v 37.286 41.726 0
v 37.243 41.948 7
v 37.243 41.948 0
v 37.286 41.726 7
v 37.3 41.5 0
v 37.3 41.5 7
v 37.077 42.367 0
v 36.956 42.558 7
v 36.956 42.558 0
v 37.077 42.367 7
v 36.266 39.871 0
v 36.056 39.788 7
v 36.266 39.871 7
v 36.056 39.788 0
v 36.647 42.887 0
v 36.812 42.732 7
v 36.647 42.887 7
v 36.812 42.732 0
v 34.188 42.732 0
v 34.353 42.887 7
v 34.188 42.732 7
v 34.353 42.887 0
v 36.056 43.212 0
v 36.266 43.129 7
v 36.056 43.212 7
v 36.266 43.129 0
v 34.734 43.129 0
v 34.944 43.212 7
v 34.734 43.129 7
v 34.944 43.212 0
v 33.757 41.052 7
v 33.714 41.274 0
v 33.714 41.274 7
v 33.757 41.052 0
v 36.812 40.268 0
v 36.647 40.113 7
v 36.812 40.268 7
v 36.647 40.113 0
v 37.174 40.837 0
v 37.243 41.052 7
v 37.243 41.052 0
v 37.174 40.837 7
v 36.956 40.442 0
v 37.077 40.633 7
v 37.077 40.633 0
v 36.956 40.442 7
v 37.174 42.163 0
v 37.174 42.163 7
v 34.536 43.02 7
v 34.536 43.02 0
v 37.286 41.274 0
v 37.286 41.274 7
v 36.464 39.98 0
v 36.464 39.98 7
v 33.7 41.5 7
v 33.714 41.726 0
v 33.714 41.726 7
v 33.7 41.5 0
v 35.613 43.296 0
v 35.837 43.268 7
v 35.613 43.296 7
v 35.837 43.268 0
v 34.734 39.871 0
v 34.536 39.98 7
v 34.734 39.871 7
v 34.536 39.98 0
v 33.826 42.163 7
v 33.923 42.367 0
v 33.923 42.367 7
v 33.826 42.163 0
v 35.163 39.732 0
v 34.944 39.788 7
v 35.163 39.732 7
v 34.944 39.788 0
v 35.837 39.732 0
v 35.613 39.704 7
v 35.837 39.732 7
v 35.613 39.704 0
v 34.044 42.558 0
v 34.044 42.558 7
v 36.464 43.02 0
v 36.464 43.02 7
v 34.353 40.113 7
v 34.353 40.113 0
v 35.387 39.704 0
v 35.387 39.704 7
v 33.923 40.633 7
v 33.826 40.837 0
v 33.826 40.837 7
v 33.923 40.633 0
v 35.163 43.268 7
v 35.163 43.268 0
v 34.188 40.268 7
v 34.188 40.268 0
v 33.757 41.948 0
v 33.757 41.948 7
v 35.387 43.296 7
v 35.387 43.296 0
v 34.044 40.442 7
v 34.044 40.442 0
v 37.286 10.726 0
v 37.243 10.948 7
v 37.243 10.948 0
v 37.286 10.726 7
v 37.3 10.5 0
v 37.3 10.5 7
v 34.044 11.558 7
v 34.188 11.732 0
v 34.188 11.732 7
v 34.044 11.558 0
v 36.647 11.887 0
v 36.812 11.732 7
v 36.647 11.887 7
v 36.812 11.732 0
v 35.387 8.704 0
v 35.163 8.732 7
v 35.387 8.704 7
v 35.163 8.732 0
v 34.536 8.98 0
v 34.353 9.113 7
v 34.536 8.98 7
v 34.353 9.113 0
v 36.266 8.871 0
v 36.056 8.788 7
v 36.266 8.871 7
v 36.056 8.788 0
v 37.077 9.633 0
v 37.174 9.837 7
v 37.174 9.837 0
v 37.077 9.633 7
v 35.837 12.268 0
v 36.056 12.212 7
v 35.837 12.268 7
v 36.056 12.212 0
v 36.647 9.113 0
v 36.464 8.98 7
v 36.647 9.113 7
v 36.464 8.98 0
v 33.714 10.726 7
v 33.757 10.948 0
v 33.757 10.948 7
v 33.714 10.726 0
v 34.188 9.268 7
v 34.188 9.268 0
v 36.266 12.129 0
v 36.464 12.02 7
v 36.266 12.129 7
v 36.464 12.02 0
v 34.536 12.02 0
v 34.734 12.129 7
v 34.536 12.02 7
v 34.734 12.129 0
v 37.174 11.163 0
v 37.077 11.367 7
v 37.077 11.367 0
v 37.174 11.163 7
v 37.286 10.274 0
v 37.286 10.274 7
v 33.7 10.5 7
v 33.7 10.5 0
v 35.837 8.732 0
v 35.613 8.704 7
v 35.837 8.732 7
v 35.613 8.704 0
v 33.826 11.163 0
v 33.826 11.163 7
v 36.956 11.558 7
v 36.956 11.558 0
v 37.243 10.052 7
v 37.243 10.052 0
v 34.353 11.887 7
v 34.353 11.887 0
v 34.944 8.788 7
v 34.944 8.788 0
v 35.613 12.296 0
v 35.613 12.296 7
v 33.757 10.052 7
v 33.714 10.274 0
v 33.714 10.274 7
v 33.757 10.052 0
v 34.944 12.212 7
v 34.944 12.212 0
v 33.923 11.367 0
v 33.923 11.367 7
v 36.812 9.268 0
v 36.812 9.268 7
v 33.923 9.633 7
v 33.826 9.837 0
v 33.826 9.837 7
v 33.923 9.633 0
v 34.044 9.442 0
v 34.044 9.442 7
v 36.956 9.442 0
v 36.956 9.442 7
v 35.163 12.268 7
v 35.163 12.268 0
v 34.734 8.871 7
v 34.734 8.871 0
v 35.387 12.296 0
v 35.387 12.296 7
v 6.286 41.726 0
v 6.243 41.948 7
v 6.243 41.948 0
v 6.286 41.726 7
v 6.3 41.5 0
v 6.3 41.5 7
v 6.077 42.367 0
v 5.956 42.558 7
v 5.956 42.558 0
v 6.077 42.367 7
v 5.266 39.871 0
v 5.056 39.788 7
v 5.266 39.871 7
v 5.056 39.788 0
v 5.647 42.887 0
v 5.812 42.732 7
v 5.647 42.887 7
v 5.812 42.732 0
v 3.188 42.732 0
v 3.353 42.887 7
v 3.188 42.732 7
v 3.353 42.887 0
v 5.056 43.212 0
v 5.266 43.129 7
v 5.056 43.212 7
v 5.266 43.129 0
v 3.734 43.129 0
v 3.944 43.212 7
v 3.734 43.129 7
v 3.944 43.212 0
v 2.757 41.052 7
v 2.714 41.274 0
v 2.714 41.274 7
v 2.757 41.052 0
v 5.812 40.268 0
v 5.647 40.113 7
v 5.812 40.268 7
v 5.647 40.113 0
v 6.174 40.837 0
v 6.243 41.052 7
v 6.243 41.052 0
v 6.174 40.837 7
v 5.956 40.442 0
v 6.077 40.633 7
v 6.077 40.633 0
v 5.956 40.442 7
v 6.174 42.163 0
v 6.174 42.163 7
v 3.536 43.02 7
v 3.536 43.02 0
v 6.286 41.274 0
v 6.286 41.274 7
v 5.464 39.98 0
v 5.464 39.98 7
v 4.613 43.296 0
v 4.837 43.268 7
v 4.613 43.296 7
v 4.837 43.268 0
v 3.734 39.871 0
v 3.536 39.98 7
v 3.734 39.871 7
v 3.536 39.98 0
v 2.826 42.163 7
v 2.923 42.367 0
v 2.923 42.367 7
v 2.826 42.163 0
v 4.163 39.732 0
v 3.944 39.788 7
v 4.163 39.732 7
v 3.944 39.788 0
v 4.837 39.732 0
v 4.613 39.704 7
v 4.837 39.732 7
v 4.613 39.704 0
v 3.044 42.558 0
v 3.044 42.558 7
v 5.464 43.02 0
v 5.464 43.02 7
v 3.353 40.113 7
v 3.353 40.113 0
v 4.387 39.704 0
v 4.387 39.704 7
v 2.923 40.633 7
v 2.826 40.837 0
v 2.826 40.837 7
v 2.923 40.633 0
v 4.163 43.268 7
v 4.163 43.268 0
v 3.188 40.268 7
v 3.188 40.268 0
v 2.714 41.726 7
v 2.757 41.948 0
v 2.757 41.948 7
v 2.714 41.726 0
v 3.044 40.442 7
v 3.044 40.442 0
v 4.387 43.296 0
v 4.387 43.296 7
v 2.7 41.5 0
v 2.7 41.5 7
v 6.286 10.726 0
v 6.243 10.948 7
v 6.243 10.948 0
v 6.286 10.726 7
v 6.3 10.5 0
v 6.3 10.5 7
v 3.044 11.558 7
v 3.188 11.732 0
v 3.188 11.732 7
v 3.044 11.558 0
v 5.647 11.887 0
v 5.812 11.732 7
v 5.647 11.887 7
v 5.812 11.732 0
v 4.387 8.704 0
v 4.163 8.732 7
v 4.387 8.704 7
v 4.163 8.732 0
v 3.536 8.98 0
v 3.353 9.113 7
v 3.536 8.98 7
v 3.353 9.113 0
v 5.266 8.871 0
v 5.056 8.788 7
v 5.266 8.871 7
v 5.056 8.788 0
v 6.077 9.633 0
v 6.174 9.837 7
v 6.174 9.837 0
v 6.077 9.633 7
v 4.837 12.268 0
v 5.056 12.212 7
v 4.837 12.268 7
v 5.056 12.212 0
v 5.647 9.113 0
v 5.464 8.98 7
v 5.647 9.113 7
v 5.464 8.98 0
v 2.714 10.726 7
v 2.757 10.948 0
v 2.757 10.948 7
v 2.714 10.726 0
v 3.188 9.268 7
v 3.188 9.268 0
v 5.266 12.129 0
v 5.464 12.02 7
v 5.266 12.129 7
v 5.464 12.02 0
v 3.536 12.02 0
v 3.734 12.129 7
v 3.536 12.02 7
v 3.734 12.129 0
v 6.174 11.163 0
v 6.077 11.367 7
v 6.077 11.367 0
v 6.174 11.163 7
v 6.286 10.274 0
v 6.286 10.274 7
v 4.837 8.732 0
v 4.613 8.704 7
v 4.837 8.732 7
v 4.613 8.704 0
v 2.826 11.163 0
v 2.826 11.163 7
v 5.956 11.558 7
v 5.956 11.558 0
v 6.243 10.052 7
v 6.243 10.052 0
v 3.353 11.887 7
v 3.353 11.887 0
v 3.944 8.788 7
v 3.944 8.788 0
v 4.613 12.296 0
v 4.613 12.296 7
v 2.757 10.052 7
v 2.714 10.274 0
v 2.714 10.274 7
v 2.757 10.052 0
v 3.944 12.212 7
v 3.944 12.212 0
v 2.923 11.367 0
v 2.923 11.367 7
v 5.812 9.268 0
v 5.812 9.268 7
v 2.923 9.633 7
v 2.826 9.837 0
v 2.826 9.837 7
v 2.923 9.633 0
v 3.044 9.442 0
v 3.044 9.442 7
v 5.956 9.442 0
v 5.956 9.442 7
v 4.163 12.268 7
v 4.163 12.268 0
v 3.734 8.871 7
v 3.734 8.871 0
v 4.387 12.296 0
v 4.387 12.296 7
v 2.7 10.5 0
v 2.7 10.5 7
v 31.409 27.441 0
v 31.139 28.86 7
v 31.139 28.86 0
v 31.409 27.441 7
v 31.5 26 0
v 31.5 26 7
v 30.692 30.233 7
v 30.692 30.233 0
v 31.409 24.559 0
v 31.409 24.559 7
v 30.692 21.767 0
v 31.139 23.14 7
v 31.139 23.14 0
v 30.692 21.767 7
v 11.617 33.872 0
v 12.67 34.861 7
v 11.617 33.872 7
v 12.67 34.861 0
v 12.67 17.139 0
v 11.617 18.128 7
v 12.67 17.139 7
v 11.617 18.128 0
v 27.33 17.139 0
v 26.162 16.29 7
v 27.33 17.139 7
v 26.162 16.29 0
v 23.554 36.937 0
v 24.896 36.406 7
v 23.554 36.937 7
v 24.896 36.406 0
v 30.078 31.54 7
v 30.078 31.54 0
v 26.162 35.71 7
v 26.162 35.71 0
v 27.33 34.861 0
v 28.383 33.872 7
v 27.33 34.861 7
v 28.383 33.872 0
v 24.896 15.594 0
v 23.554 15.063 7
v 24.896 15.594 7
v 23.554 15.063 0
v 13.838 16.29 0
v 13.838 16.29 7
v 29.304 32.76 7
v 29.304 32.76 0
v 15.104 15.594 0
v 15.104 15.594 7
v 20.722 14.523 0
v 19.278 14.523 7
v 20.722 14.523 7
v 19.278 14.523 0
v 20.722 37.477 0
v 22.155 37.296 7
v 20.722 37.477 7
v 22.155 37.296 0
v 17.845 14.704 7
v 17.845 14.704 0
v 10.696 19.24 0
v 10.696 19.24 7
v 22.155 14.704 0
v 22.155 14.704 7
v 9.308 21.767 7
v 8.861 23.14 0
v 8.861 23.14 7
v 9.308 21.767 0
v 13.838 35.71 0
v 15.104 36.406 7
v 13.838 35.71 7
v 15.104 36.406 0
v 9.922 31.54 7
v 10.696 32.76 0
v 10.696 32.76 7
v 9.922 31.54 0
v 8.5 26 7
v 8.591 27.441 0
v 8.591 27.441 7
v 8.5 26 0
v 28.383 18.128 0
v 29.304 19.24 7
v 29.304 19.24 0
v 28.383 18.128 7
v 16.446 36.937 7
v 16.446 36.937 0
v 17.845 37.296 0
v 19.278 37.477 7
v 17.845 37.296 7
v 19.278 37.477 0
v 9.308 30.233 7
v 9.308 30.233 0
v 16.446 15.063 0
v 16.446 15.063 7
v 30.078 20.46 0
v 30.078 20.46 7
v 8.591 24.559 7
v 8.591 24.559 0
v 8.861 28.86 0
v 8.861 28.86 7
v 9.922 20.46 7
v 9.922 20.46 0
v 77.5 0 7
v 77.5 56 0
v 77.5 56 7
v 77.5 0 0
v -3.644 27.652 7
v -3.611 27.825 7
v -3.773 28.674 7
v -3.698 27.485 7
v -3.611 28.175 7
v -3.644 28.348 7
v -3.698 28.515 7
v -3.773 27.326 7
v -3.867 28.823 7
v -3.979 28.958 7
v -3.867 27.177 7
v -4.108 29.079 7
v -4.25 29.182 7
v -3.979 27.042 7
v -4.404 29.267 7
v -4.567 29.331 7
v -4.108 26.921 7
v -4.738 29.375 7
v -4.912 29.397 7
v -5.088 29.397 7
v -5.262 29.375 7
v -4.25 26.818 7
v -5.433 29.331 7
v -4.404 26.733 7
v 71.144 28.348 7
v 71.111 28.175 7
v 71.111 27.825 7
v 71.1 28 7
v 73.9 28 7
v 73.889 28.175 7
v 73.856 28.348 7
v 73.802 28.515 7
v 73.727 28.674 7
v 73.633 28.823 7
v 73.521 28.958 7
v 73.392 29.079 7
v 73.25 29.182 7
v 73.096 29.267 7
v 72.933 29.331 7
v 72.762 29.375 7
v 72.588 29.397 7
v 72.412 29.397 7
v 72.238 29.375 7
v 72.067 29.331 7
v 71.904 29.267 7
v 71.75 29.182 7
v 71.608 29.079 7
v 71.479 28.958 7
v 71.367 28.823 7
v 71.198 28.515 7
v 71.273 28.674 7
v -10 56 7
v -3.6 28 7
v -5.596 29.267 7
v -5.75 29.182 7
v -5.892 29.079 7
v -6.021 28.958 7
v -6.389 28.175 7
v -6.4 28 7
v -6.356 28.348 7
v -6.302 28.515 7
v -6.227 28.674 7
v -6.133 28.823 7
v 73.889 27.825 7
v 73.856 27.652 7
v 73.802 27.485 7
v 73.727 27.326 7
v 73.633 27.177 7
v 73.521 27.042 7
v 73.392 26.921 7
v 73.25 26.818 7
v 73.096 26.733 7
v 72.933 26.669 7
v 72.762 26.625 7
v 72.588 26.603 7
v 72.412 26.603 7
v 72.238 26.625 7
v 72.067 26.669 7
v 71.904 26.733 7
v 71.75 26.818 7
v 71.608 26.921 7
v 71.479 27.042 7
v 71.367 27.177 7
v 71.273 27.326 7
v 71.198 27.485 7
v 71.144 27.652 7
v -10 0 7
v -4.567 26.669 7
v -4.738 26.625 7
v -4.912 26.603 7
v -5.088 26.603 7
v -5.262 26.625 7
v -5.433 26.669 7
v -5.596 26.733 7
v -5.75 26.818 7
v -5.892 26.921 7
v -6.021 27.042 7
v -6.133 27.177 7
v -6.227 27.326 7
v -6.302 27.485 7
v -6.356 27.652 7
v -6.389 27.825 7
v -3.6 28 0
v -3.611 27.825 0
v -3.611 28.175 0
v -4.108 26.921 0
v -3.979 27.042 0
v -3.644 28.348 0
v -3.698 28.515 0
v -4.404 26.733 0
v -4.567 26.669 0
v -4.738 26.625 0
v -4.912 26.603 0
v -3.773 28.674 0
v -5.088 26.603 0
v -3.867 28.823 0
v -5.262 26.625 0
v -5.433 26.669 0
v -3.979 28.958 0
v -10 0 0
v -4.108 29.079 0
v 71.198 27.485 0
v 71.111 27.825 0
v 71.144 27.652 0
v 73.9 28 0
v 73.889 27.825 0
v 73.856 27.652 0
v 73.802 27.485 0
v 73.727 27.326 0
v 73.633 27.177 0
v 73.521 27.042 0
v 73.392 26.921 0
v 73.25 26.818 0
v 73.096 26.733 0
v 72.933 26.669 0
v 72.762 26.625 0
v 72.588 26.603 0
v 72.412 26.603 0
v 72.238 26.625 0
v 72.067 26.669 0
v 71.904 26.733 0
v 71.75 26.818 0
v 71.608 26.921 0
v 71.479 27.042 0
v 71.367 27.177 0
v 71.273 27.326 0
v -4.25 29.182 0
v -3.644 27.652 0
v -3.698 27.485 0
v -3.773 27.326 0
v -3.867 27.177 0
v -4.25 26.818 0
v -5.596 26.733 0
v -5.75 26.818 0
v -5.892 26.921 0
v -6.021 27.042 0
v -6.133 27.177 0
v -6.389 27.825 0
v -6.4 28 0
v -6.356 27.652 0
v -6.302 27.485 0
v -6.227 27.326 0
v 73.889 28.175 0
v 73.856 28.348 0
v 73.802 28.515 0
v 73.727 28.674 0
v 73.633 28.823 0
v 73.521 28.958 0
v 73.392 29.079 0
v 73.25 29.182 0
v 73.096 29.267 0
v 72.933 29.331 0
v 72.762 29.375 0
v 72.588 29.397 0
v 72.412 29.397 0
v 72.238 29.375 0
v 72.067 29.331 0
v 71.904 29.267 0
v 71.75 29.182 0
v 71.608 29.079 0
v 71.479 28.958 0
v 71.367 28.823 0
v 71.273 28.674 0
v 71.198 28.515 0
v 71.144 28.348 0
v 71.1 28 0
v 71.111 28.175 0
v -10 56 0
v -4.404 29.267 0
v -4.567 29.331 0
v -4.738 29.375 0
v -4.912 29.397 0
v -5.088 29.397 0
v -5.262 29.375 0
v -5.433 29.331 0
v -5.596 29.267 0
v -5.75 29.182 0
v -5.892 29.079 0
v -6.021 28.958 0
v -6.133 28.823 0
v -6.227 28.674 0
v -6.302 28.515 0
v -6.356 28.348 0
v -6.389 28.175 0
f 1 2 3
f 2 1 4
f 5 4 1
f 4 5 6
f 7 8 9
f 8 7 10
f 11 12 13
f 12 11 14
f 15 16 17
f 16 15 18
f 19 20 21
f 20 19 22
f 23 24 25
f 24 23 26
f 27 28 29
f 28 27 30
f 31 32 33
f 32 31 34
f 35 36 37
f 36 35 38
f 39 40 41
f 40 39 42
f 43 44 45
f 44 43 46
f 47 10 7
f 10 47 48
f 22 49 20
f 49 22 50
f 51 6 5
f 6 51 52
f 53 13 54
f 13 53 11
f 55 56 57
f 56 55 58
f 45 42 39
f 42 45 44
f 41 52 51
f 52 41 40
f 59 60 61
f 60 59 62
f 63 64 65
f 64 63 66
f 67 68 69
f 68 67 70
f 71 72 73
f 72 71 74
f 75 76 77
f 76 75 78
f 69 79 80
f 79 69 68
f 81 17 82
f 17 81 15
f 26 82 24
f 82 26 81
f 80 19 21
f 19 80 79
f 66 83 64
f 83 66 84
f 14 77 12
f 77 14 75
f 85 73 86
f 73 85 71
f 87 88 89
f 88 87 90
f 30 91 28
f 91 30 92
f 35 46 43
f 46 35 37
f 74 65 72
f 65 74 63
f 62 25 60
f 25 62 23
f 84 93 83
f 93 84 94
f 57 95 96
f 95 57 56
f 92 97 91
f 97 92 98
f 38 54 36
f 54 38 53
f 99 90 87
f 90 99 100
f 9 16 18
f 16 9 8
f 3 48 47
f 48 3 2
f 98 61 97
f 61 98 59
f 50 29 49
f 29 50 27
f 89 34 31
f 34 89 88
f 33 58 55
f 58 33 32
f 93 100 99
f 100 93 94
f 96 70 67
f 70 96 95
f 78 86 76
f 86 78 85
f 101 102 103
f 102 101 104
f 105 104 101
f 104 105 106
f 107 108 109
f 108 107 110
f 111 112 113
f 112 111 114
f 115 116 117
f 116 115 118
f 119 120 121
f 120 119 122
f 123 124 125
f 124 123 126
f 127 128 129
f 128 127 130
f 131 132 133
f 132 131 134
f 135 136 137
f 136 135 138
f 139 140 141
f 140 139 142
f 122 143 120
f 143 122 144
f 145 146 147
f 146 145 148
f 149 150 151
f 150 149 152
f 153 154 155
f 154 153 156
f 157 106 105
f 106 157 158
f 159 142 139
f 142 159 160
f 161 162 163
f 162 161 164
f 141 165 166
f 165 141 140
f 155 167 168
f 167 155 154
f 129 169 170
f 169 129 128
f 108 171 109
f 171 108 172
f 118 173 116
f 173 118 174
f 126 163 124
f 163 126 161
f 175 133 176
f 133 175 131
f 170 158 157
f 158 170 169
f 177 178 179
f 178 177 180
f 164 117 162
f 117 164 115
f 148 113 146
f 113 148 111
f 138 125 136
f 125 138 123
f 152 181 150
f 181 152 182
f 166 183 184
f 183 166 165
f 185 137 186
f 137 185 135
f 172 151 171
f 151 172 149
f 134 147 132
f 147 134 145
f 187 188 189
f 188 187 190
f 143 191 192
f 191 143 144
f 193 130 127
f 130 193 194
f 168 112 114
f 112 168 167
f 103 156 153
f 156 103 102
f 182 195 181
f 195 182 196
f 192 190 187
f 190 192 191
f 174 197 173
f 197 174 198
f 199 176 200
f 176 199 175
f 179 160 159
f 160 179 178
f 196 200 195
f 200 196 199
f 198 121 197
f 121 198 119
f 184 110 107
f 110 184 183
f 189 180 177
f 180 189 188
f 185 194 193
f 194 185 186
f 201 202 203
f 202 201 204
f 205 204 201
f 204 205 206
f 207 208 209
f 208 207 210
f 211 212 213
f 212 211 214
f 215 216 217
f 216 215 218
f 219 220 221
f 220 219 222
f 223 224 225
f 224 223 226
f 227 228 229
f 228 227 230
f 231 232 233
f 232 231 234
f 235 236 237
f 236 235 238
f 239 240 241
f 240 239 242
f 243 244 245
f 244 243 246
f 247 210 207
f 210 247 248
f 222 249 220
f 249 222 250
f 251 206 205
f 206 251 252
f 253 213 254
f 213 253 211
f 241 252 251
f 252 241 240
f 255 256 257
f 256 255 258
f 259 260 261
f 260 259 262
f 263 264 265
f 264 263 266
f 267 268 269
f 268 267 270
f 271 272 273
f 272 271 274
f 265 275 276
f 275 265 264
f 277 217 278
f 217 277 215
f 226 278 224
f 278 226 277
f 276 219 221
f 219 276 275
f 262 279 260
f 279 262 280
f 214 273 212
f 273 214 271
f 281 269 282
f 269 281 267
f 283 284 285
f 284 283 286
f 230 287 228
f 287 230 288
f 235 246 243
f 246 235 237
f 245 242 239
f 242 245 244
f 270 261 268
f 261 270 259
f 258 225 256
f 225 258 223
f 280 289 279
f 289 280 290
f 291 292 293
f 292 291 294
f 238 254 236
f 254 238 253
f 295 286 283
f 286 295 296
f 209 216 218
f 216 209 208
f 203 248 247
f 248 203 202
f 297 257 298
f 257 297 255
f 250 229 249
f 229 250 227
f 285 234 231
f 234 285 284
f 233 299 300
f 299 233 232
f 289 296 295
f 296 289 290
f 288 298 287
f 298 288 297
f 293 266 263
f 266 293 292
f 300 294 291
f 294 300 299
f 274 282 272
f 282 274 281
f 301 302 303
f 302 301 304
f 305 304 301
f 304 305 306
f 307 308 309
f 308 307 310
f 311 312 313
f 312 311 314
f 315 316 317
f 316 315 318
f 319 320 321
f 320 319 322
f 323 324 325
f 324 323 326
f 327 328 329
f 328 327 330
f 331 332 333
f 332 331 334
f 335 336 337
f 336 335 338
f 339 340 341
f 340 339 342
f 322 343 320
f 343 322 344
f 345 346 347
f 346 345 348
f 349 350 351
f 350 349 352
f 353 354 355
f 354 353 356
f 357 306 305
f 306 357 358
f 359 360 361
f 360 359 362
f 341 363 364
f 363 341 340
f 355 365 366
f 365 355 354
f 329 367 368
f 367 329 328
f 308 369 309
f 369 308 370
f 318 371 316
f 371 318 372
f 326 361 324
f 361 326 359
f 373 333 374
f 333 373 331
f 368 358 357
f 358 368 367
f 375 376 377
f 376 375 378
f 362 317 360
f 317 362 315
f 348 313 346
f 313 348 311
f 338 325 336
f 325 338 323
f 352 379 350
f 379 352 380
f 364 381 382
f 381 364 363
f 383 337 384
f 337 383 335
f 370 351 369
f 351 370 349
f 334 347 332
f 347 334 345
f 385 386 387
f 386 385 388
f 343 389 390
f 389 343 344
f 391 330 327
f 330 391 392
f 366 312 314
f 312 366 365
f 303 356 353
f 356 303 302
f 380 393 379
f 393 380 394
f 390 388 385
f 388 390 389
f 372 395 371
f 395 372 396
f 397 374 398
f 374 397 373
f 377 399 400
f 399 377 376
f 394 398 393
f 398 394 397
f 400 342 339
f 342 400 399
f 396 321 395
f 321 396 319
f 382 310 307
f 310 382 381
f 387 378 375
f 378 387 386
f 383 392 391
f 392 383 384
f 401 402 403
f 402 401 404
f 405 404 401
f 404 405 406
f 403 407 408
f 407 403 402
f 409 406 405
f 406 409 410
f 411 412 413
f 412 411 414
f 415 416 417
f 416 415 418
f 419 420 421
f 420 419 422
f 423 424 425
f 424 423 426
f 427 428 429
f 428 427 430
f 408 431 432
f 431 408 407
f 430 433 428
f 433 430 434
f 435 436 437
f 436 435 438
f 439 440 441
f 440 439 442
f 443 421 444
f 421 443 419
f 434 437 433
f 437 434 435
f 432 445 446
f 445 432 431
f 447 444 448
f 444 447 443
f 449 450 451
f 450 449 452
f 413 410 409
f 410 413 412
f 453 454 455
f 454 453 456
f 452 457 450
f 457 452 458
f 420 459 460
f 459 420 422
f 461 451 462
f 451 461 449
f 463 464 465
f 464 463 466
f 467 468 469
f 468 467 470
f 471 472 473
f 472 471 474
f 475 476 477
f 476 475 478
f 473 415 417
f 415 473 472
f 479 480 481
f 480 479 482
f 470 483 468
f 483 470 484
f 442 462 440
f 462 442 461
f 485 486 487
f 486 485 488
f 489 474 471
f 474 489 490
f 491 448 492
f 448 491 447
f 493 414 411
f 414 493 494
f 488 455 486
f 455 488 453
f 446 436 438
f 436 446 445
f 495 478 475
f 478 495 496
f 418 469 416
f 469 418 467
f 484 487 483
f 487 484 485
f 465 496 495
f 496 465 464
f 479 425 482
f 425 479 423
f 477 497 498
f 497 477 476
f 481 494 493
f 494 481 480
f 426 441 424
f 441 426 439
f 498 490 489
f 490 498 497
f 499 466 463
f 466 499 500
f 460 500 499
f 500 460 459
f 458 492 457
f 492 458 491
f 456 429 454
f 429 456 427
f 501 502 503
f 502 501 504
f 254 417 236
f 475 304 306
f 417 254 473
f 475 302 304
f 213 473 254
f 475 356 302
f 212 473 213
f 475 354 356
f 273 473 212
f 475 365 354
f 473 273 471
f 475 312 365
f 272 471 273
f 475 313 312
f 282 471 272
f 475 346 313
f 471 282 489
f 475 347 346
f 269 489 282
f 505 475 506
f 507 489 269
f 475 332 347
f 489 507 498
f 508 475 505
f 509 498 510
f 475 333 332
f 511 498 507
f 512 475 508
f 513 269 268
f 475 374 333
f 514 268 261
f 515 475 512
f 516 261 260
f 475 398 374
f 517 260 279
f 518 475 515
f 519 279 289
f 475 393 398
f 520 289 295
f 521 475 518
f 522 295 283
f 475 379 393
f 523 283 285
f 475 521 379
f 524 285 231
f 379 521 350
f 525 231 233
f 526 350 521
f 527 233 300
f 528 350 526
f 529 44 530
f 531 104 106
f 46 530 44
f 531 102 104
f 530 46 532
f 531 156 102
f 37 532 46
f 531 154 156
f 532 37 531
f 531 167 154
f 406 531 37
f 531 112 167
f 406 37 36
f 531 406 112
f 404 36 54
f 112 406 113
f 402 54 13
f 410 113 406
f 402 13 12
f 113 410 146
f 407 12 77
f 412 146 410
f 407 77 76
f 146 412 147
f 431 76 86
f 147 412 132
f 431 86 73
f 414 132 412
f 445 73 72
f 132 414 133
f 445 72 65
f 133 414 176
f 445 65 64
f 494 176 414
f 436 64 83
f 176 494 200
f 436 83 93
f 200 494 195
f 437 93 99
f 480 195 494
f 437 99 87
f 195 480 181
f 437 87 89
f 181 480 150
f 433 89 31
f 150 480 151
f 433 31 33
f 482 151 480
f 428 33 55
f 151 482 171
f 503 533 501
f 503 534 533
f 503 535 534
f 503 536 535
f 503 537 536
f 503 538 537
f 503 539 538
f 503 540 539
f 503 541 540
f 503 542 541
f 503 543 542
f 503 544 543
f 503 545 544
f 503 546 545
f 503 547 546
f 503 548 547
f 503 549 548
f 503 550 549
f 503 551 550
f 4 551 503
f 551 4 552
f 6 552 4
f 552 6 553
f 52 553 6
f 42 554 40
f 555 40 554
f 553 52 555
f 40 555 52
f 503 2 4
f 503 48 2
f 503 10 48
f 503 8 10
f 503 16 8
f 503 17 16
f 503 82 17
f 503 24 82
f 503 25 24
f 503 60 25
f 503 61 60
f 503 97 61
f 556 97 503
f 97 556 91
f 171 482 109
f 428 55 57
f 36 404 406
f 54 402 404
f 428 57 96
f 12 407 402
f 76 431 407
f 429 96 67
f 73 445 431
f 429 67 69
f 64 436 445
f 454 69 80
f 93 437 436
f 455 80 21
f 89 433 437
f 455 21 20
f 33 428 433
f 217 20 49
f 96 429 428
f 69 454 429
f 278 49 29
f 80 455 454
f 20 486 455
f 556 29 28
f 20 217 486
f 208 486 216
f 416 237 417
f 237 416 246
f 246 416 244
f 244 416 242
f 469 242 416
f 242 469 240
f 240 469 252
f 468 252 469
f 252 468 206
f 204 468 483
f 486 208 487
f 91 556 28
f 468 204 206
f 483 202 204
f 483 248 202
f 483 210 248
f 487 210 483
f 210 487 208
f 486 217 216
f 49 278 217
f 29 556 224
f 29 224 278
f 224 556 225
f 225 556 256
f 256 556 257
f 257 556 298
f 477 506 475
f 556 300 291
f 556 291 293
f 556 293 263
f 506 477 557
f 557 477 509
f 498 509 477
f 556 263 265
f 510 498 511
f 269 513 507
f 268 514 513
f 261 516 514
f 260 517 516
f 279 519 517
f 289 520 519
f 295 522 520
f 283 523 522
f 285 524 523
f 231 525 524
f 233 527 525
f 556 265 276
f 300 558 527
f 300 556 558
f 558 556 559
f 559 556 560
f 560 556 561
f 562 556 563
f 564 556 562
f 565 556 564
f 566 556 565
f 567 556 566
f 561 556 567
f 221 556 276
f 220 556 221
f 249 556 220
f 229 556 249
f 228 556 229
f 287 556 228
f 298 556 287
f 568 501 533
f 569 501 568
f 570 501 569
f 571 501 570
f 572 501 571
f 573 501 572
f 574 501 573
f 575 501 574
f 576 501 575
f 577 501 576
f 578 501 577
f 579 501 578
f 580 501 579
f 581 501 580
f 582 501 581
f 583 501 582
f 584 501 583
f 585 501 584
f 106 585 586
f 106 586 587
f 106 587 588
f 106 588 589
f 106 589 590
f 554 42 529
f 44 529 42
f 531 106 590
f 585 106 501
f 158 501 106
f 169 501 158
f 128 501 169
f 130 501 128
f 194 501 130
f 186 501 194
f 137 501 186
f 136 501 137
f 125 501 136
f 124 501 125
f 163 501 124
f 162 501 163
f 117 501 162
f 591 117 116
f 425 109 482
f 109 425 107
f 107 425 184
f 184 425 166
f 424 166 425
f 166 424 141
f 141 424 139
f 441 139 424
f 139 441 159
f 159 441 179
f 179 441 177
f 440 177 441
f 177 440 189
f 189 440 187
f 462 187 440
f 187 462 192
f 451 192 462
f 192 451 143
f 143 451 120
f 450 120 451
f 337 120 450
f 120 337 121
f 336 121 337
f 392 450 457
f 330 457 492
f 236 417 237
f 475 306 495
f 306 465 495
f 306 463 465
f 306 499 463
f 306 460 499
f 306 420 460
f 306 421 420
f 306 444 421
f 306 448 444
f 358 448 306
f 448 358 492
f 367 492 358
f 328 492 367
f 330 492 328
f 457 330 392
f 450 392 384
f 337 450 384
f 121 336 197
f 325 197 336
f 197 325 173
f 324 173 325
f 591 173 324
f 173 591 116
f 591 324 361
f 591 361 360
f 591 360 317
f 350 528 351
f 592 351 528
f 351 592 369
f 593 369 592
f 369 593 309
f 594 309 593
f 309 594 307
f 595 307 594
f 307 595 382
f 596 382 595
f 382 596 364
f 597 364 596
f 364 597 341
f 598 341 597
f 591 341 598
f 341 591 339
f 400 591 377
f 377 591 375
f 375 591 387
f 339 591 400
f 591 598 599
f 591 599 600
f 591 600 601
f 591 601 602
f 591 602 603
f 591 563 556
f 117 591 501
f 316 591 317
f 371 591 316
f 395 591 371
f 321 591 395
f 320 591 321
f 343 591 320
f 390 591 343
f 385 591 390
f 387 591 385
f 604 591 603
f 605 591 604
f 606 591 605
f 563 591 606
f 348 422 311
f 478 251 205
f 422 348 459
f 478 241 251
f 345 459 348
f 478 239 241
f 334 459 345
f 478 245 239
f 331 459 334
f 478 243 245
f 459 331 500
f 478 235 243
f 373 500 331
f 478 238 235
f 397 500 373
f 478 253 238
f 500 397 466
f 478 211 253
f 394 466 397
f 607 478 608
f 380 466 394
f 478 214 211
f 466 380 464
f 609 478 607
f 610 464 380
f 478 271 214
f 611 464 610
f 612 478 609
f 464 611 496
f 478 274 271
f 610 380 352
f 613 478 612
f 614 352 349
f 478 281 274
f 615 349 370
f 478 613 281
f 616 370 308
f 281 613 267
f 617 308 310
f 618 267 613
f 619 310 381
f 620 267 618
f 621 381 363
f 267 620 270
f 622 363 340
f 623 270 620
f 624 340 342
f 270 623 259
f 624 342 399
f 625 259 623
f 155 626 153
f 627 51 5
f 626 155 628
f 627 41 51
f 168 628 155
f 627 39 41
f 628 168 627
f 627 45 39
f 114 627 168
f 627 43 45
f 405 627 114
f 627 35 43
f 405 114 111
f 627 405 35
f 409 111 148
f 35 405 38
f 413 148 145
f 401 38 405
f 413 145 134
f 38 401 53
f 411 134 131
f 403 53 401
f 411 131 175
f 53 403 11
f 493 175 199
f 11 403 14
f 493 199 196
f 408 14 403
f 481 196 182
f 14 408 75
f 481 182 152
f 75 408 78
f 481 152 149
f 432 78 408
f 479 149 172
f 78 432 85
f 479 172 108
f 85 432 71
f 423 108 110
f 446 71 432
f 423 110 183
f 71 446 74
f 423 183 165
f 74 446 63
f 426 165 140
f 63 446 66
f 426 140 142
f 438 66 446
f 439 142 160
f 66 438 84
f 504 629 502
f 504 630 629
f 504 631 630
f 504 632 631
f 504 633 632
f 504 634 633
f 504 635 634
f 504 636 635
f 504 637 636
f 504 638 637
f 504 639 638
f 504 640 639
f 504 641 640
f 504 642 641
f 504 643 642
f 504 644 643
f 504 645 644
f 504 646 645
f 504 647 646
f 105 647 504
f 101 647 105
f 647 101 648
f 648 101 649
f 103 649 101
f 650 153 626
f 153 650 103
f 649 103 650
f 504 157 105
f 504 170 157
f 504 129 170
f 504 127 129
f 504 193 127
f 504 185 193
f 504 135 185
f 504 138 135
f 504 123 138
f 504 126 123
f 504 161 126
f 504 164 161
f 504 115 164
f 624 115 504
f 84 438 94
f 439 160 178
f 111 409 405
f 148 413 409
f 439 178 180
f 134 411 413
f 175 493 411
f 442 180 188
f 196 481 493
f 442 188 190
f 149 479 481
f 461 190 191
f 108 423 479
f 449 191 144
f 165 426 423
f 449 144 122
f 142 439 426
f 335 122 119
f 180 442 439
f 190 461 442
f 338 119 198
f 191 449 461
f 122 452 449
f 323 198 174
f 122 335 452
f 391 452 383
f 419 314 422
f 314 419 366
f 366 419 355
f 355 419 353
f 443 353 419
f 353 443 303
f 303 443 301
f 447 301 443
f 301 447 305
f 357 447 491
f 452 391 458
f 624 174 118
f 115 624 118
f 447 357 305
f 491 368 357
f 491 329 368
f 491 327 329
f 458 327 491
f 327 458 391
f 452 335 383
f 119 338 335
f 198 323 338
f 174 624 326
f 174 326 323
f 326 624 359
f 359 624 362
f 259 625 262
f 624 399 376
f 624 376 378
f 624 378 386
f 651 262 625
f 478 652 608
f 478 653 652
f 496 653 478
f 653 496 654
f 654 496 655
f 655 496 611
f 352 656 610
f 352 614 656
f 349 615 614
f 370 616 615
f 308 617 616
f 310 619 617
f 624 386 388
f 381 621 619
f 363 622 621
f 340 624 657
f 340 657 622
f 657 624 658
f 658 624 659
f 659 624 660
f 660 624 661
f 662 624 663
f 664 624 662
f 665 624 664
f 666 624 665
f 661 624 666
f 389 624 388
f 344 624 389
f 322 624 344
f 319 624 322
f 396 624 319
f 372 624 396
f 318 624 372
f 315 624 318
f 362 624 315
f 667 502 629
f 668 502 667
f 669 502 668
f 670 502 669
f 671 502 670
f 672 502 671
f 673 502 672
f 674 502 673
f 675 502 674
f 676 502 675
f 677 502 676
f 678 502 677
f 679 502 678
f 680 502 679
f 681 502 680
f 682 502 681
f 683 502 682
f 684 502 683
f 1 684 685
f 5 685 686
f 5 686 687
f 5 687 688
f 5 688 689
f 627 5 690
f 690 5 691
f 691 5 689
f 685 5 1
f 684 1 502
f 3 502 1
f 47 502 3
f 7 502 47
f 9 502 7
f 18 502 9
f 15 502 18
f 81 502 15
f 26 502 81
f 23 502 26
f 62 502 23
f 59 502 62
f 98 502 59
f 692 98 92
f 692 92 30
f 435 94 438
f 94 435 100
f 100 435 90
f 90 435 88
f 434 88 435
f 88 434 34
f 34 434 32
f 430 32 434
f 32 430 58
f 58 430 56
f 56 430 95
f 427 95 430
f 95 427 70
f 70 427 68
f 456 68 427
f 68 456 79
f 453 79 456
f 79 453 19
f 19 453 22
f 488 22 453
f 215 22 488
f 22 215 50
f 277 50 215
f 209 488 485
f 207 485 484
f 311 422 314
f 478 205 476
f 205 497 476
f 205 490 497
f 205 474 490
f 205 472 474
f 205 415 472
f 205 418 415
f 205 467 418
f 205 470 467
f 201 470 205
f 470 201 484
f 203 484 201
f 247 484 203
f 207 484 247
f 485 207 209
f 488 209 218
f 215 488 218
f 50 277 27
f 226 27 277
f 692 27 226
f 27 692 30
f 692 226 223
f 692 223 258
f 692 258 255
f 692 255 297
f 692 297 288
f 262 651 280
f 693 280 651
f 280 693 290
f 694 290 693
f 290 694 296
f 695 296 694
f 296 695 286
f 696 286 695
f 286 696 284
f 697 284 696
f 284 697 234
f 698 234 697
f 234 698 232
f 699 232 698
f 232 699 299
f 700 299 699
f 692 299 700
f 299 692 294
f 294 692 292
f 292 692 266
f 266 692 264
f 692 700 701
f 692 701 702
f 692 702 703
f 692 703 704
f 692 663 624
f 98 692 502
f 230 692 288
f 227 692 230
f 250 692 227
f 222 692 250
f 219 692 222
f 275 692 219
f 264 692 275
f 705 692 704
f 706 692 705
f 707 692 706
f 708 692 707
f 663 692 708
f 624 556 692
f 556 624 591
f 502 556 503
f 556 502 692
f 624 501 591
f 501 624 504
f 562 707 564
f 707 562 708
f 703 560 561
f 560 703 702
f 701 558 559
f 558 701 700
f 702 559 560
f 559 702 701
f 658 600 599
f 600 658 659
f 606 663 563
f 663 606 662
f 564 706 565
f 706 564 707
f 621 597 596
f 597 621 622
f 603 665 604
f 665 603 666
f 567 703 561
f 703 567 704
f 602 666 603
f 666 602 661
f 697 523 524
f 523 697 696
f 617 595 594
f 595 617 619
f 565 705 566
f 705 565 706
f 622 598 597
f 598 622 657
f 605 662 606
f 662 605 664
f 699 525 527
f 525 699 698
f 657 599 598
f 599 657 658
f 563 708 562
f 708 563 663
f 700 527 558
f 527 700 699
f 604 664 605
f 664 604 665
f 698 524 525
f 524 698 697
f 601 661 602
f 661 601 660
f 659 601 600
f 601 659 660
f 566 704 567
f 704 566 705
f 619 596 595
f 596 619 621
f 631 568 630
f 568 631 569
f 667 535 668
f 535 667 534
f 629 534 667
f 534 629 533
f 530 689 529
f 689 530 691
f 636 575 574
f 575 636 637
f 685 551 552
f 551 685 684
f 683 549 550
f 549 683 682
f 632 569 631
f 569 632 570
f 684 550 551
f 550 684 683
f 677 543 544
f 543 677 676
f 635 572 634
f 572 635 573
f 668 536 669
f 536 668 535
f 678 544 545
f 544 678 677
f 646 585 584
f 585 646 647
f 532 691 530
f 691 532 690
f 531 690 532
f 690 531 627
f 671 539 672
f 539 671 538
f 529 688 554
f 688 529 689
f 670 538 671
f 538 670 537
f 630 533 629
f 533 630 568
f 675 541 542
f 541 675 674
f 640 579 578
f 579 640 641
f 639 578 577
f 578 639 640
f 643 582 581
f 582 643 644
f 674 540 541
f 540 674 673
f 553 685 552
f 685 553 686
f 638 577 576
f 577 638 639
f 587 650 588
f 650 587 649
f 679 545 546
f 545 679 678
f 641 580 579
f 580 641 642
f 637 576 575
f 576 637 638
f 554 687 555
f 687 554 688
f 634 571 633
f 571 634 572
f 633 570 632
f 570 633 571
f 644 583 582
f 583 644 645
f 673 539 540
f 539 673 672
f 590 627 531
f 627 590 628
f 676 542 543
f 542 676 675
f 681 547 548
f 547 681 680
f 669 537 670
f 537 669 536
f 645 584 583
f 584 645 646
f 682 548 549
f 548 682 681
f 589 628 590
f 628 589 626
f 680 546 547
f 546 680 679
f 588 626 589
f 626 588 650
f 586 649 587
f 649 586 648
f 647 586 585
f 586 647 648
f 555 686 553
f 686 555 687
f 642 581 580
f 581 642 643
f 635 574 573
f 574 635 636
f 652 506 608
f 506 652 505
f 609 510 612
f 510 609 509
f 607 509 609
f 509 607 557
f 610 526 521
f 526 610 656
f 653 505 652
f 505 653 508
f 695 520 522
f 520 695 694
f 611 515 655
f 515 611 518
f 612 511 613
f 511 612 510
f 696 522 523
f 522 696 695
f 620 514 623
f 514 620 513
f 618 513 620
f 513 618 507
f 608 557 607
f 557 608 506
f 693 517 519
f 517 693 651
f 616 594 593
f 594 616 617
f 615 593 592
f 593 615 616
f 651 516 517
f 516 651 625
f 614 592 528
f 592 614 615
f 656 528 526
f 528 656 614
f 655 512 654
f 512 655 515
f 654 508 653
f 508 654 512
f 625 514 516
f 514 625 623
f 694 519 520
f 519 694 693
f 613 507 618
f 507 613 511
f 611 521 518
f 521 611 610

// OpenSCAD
$fn = 50;

height = 7;

difference() {
translate ([-10,0,0]) cube([67.5+20, 56, height]);
translate ([20,26,0]){
    translate ([15.5,15.5,0]) cylinder(  height*2+1, 1.8, 1.8, true );
    translate ([15.5,-15.5,0]) cylinder(  height*2+1, 1.8, 1.8, true );
    translate ([-15.5,15.5,0]) cylinder(  height*2+1, 1.8, 1.8, true );
    translate ([-15.5,-15.5,0]) cylinder(  height*2+1, 1.8, 1.8, true );
    cylinder(  height*2+1, 11.5, 11.5, true );
 }
translate ([-10,56/2-10/2,0])
translate ([5,5,0])
 cylinder(  height*2+1, 1.4, 1.4, true );
 
 translate ([67.5,56/2-10/2,0])
 translate ([5,5,0])
 cylinder(  height*2+1, 1.4, 1.4, true );
}
translate ([-10,56/2-10/2,0]) difference(){
    cube([10, 10, height]);
    translate ([5,5,0]) cylinder(  height*2+1, 1.4, 1.4, true );
};
translate ([67.5,56/2-10/2,0]) difference(){
    cube([10, 10, height]);
    translate ([5,5,0]) cylinder(  height*2+1, 1.4, 1.4, true );
}
